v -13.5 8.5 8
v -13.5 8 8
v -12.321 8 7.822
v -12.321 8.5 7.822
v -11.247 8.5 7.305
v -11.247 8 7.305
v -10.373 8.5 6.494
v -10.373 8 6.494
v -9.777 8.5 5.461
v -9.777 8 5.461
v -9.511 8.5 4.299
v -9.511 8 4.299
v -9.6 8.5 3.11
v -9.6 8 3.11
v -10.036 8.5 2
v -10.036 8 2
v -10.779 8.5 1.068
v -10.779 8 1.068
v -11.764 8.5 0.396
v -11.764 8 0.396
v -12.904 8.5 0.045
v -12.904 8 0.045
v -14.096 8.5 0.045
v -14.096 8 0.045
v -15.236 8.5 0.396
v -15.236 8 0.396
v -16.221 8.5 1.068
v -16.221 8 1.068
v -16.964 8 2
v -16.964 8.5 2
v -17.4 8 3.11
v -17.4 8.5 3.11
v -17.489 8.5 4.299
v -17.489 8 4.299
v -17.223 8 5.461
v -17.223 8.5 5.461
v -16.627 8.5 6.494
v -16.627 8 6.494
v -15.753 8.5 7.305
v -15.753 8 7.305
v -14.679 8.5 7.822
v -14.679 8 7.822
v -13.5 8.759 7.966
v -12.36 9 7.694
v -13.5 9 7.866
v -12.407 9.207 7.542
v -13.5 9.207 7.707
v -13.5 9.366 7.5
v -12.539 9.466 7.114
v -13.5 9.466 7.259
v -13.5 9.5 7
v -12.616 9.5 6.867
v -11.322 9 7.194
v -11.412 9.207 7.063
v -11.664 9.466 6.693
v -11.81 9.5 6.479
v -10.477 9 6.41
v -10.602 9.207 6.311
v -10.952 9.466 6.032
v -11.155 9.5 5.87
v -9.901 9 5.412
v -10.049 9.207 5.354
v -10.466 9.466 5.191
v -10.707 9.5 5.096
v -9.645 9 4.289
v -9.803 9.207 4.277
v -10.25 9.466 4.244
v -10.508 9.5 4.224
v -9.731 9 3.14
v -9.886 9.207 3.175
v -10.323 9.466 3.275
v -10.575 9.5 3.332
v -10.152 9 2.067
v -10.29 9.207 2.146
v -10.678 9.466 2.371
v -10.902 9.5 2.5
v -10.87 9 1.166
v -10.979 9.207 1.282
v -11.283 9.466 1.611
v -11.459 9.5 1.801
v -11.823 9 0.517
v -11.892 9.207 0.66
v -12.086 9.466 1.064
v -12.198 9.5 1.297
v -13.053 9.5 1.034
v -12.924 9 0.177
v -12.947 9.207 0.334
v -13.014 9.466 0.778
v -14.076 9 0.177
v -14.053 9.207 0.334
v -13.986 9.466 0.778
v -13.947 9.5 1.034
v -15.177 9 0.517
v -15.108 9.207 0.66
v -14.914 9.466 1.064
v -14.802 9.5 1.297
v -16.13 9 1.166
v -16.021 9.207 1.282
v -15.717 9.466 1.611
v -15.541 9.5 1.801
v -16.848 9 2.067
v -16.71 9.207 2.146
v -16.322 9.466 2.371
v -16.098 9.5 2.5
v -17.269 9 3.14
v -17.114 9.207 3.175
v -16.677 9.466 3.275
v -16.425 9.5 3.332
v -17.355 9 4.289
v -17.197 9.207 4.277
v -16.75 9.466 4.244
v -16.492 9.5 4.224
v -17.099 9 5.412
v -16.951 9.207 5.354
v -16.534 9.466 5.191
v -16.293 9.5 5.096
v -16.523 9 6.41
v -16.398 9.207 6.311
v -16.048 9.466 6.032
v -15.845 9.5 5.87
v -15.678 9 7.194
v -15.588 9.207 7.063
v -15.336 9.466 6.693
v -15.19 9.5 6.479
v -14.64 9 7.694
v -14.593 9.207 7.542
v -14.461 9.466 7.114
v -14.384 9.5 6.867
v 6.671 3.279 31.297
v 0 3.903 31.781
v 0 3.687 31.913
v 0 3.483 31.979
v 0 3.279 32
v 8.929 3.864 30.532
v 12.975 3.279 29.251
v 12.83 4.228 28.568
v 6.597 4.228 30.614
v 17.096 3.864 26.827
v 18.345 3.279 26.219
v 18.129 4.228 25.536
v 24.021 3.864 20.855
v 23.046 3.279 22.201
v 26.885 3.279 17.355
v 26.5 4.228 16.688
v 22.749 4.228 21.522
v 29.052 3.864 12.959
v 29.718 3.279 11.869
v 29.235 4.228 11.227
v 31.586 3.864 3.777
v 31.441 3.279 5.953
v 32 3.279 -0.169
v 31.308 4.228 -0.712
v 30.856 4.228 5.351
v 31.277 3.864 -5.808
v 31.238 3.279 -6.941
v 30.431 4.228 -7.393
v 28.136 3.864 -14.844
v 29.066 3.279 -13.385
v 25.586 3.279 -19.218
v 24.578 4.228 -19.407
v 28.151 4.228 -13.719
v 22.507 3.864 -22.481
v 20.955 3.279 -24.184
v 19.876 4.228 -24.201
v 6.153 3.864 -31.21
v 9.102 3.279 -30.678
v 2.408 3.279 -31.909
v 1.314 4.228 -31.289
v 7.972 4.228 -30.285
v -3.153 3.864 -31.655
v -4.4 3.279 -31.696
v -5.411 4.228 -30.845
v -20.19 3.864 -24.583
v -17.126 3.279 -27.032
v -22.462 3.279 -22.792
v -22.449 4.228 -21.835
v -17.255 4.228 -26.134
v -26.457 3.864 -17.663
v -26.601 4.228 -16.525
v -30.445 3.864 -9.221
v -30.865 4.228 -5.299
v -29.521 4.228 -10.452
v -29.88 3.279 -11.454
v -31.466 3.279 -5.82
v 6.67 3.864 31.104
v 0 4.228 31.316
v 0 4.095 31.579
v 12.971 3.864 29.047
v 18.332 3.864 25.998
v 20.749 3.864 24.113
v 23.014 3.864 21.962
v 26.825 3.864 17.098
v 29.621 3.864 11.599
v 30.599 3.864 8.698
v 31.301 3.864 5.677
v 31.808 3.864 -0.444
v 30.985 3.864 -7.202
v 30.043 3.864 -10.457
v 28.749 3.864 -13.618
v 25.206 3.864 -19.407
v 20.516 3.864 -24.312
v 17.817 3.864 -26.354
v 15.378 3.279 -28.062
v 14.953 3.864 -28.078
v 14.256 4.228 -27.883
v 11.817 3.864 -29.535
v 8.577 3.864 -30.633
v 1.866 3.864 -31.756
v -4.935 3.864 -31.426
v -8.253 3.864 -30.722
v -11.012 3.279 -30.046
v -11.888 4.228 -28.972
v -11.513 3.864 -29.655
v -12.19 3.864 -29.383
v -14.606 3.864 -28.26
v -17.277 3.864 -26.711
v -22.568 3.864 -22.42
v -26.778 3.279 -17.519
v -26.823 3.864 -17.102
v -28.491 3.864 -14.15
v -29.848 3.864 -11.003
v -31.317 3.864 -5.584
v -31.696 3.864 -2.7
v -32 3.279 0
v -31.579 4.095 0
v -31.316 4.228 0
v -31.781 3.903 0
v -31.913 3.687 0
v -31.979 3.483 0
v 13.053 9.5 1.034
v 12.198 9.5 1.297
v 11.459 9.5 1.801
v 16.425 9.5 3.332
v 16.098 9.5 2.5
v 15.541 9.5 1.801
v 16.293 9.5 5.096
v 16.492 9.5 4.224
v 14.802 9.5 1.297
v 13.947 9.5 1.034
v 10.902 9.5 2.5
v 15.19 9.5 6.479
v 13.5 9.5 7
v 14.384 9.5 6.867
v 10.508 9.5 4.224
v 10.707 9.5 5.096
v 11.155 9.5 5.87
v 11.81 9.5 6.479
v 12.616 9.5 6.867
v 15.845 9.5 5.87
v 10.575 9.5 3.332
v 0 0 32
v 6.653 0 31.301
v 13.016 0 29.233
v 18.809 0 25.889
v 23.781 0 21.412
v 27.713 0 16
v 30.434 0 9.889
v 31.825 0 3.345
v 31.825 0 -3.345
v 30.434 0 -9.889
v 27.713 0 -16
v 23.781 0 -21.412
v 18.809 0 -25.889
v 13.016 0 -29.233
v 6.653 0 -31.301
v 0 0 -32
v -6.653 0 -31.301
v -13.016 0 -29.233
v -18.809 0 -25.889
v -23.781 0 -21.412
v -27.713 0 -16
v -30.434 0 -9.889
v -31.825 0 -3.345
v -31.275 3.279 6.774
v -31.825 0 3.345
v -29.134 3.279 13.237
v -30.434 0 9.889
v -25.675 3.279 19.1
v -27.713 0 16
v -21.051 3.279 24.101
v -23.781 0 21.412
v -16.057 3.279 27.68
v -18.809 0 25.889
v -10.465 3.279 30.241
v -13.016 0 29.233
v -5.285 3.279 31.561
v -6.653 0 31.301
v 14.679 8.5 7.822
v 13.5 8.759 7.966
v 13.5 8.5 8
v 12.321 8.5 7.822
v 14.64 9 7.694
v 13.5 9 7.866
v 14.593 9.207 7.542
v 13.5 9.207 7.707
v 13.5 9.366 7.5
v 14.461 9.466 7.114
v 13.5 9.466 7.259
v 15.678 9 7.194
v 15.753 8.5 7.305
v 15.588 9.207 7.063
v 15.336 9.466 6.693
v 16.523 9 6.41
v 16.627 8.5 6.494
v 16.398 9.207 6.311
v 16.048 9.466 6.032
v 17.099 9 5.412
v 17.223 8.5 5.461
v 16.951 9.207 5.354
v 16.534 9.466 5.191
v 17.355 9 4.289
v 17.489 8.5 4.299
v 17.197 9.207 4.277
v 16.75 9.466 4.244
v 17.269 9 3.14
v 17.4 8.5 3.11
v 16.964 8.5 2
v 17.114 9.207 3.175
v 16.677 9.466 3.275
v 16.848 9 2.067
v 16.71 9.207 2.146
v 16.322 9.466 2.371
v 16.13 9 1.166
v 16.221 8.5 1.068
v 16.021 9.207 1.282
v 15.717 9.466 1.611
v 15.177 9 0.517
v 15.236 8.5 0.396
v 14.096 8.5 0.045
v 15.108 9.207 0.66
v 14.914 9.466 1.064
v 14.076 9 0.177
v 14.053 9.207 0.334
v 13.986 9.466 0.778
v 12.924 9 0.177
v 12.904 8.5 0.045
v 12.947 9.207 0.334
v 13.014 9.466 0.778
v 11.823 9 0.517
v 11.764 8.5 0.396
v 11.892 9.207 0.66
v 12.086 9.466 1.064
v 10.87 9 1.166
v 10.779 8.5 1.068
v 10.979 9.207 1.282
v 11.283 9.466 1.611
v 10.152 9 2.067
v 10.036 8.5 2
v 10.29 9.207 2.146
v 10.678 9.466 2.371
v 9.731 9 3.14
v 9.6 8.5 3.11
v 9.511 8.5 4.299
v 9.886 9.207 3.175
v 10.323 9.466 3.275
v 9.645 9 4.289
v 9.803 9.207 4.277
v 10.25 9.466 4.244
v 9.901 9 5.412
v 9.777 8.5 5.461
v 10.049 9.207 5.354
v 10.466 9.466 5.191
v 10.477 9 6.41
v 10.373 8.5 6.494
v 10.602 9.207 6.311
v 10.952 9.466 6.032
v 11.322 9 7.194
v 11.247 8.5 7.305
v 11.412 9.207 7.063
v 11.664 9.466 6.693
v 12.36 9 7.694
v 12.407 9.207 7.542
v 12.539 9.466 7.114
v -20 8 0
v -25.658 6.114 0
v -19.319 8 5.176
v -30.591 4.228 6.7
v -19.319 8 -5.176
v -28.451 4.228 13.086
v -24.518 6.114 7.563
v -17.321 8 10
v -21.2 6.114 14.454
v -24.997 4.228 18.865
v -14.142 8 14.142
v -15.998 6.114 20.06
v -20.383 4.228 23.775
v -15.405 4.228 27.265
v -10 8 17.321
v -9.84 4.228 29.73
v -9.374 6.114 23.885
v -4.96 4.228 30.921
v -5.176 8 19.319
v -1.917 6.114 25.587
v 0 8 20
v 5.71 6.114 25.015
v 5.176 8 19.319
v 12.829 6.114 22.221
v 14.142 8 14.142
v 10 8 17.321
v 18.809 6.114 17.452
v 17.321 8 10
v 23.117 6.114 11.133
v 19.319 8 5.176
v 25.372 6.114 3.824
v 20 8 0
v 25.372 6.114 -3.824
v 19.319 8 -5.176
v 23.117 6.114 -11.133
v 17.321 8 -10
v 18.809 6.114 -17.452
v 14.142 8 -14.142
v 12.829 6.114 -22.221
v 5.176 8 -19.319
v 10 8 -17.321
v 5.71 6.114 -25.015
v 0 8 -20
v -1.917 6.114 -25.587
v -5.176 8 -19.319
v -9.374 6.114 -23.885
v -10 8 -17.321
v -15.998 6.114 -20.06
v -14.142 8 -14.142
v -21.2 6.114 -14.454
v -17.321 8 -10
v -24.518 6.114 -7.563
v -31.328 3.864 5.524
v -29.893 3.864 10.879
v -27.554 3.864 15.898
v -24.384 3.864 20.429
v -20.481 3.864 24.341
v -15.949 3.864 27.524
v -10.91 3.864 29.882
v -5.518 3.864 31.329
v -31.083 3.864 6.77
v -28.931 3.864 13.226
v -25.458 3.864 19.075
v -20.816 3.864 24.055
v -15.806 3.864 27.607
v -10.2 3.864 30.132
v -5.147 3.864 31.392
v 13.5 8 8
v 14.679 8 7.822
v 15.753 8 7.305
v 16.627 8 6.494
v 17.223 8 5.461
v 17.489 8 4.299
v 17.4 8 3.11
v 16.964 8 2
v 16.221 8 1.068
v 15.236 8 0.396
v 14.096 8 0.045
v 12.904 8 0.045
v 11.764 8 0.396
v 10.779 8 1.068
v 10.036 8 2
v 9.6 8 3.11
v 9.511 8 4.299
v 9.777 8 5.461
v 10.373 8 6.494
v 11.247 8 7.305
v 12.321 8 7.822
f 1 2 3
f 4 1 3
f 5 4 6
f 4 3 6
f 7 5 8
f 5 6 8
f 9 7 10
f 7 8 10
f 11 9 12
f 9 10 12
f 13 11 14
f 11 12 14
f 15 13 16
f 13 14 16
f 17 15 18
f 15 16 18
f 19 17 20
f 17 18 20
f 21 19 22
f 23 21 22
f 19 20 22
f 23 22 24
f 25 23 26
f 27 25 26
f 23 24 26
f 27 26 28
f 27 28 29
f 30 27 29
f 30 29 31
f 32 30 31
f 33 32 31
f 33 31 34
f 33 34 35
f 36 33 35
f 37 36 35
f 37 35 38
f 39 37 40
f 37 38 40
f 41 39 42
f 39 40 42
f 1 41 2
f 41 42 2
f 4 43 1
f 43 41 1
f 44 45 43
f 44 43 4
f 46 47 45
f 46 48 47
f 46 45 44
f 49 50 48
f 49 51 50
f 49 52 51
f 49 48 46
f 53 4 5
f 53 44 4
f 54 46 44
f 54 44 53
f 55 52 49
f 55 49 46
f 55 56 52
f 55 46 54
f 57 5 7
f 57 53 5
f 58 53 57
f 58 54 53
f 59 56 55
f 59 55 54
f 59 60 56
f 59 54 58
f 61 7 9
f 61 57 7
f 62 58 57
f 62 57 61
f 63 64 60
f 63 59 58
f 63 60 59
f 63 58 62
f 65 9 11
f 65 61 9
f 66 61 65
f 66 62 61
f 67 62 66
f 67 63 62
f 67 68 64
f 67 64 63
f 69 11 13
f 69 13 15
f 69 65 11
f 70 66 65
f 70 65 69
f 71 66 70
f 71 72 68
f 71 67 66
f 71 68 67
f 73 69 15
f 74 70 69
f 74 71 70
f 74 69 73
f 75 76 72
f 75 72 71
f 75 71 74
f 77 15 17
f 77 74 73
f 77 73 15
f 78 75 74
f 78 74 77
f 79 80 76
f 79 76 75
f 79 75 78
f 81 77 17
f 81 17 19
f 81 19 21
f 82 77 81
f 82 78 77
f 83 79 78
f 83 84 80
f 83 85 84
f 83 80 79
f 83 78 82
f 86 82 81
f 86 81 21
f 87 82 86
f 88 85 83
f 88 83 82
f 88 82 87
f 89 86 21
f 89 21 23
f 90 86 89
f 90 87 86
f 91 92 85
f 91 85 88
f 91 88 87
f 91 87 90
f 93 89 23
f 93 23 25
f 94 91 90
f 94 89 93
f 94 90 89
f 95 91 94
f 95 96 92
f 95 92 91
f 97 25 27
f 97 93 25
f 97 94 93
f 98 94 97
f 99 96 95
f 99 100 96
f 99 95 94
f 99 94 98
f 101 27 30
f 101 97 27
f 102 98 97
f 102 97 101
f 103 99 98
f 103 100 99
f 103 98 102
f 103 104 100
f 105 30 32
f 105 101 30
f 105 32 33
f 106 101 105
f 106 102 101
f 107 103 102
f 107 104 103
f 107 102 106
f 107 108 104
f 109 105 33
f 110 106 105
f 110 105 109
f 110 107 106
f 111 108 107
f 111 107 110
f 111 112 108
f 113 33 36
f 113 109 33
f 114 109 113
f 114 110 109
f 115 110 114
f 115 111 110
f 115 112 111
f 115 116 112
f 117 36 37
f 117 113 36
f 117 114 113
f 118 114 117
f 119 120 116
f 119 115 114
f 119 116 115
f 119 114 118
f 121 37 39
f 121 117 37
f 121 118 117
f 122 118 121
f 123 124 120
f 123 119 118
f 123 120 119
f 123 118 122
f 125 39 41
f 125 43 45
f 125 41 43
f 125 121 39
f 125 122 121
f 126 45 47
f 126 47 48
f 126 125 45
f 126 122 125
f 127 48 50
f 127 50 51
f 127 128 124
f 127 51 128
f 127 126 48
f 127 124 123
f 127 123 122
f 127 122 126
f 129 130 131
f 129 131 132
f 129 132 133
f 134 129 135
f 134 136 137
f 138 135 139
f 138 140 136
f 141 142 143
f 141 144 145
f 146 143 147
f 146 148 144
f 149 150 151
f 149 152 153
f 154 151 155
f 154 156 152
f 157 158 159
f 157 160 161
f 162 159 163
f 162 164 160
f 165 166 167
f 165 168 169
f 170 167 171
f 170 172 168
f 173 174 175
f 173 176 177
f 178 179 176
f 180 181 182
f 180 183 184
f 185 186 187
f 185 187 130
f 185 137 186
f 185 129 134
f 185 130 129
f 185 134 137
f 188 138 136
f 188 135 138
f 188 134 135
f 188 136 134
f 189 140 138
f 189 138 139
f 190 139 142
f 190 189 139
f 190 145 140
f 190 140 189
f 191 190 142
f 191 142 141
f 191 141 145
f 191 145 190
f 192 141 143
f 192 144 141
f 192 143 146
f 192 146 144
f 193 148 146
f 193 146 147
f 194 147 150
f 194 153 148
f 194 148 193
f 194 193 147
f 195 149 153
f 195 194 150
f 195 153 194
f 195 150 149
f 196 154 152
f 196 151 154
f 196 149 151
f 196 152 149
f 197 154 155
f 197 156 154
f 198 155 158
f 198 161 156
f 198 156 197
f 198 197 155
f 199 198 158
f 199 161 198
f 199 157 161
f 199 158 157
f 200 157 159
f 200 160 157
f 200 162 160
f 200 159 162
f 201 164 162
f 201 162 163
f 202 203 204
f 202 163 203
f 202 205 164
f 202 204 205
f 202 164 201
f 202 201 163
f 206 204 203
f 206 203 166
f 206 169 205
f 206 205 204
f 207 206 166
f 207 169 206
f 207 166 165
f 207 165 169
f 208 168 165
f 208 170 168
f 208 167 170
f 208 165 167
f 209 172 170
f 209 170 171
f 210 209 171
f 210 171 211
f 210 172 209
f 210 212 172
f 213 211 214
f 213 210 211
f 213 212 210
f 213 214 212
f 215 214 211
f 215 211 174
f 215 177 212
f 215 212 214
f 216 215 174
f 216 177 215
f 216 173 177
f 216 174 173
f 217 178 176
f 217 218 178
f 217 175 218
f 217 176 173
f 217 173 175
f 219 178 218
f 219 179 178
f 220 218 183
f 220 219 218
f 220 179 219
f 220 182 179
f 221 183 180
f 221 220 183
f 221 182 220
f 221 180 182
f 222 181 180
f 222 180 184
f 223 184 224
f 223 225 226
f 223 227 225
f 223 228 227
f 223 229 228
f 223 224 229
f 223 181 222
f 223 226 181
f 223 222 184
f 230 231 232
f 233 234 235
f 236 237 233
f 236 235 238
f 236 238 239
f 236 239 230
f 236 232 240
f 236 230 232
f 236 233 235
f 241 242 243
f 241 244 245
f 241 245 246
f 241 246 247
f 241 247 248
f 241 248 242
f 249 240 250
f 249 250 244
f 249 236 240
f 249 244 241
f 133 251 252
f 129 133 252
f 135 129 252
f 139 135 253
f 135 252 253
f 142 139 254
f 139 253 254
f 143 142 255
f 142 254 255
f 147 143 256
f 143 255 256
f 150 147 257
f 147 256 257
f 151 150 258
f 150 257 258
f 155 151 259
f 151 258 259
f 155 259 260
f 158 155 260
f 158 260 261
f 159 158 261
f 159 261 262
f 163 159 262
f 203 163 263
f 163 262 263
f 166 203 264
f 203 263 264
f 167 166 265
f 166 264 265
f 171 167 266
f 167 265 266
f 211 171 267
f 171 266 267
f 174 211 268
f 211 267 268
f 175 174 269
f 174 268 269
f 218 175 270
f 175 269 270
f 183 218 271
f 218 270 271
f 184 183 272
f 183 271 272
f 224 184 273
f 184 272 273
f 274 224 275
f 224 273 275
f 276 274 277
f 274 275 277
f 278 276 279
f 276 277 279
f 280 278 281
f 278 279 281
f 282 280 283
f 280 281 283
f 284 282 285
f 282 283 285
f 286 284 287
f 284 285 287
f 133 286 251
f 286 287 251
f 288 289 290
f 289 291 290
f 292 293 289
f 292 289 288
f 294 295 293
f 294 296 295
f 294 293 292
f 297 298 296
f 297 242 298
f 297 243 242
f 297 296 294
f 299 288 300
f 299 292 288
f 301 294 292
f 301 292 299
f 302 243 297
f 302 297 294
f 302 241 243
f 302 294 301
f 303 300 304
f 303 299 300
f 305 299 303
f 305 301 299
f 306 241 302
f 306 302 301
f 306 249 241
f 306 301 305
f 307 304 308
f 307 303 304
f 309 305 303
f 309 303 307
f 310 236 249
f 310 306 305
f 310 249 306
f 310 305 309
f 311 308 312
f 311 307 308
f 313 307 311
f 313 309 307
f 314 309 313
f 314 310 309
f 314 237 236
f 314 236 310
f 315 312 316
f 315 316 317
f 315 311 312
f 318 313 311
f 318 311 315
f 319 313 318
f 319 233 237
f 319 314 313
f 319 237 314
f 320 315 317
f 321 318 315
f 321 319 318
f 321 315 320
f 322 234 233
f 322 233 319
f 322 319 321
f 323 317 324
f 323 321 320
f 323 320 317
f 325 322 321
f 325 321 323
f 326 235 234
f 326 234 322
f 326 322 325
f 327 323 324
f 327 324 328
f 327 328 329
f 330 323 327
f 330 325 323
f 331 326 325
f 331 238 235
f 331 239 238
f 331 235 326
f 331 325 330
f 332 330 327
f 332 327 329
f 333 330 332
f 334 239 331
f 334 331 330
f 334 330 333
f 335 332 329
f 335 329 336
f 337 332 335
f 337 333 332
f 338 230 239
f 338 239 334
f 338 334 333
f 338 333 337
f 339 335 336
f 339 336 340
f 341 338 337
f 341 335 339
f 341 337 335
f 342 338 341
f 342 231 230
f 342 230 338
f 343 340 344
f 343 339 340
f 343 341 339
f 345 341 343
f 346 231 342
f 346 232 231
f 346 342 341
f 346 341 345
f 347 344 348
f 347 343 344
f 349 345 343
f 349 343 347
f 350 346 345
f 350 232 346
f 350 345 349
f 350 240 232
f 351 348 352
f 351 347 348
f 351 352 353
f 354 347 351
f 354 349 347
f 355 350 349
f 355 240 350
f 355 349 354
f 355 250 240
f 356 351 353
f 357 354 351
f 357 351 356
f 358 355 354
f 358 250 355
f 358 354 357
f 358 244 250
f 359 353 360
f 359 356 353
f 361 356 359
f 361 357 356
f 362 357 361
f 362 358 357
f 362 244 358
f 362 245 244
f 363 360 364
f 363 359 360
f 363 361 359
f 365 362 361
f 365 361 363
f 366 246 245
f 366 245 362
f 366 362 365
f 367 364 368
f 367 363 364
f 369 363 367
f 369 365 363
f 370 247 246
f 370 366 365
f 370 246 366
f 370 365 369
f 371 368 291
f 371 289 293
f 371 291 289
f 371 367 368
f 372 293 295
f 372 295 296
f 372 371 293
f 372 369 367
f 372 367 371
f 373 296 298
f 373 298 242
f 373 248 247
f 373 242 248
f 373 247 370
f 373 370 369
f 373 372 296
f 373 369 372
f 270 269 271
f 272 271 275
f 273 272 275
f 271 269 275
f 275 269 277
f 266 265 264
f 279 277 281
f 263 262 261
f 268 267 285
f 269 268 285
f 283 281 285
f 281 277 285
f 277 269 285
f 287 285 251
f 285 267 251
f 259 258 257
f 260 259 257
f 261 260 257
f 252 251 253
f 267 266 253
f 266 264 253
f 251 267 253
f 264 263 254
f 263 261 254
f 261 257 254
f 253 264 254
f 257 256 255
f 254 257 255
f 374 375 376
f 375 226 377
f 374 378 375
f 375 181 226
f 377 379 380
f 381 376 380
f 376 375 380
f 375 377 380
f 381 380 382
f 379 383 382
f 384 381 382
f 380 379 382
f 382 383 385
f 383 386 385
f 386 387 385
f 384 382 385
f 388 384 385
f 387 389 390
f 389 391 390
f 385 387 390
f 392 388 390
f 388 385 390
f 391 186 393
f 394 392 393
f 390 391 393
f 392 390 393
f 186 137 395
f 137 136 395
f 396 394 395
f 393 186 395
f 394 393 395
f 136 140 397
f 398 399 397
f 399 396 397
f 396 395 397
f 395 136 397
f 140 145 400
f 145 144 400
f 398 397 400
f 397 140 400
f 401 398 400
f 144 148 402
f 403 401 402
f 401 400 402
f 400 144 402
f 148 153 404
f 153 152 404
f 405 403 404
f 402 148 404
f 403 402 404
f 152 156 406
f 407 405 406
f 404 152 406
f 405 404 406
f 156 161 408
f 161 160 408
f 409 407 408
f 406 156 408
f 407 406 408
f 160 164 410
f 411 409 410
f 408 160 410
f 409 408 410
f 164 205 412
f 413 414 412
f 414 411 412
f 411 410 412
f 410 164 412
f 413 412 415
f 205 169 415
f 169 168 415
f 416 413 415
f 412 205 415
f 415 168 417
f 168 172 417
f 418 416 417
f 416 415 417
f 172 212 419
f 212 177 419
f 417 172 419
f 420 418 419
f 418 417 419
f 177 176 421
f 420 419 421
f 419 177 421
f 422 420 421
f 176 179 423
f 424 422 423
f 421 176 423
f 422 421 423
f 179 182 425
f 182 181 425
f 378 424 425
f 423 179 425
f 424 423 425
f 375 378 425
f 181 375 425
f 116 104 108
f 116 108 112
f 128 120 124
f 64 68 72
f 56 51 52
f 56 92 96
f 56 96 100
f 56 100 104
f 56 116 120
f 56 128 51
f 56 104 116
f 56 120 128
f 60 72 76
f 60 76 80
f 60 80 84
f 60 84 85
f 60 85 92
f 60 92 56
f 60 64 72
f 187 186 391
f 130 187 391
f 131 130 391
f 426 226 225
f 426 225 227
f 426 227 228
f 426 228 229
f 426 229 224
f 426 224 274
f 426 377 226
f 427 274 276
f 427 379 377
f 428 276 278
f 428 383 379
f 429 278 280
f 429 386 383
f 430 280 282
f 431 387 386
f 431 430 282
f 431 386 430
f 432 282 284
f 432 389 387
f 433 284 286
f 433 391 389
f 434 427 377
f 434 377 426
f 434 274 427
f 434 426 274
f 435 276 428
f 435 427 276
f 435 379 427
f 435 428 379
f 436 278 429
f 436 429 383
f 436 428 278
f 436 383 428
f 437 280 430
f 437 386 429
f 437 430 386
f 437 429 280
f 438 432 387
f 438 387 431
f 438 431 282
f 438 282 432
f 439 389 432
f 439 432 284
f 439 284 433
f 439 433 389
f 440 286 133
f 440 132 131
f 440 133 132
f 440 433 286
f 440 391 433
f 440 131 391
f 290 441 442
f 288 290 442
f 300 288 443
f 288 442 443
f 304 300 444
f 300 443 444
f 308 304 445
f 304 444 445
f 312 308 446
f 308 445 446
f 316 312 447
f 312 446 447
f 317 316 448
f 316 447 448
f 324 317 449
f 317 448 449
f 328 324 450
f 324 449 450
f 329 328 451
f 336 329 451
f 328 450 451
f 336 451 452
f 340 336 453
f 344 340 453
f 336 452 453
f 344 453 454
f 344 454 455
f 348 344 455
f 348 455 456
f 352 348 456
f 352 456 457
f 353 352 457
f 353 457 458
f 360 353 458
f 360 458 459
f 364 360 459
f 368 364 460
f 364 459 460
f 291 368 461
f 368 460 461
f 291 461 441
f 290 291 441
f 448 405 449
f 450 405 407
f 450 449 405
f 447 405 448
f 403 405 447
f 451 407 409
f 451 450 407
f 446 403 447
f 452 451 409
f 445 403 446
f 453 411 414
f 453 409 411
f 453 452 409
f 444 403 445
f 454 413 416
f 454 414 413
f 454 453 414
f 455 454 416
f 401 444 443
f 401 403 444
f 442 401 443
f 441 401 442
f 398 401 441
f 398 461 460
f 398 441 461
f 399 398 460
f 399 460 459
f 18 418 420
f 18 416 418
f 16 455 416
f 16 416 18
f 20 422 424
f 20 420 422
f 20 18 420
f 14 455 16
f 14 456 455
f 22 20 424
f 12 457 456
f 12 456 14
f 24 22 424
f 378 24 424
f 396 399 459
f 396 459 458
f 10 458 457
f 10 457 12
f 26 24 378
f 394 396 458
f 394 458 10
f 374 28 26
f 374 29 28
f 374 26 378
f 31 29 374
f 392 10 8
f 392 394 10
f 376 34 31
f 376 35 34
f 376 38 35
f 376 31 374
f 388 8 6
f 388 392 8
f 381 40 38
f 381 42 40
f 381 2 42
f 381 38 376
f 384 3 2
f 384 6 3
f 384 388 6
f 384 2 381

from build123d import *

# Parameters (mm, degrees)
SKETCH1_R           = 32
BOSS_EXTRUDE1_DEPTH = 4
SKETCH3_R           = 20
SKETCH2_R           = 32
FILLET1_R           = 1
SKETCH4_R           = 4
BOSS_EXTRUDE2_DEPTH = 1.5
FILLET2_R           = 1


with BuildPart() as part:
    # Sketch1 → Boss-Extrude1 (new body)
    with BuildSketch(Plane(origin=(0, 0, 0), x_dir=(1, 0, 0), z_dir=(0, 1, 0))):
        Circle(SKETCH1_R)
    extrude(amount=BOSS_EXTRUDE1_DEPTH)

    # Sketch3 → Loft1 section 0
    with BuildSketch(Plane(origin=(0, 8, 0), x_dir=(-1, 0, 0), z_dir=(0, 1, 0))):
        Circle(SKETCH3_R)
    # Sketch2 → Loft1 section 1
    with BuildSketch(Plane(origin=(0, 4, 0), x_dir=(1, 0, 0), z_dir=(0, 1, 0))):
        Circle(SKETCH2_R)
    loft()

    # Fillet1
    fillet1_edges = [part.edges().sort_by_distance(p)[0] for p in [
        (0, 4, 32),
    ]]
    fillet(fillet1_edges, radius=FILLET1_R)

    # Sketch4 → Boss-Extrude2 (add)
    with BuildSketch(Plane(origin=(0, 8, 0), x_dir=(1, 0, 0), z_dir=(0, 1, 0))):
        with Locations((-13.5, -4)):
            Circle(SKETCH4_R)
        with Locations((13.5, -4)):
            Circle(SKETCH4_R)
    extrude(amount=BOSS_EXTRUDE2_DEPTH)

    # Fillet2
    fillet2_edges = [part.edges().sort_by_distance(p)[0] for p in [
        (-17.5, 9.5, 4),
        (9.5, 9.5, 4),
    ]]
    fillet(fillet2_edges, radius=FILLET2_R)


solid = part.part
